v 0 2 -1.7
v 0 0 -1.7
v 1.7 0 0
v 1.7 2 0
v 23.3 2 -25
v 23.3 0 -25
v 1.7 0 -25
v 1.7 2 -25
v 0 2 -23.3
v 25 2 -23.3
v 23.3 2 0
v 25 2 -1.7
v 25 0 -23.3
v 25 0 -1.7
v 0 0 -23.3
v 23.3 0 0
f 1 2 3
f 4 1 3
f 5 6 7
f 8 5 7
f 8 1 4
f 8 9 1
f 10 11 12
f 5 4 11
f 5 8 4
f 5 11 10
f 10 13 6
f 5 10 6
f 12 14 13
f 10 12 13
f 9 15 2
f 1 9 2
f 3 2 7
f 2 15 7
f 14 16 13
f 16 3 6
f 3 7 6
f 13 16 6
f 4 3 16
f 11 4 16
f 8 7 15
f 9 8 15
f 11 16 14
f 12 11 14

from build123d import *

# Parameters (mm, degrees)
GPS_ANTENNA_DEPTH = 2


with BuildPart() as part:
    # Sketch1 → GPS Antenna (new body)
    with BuildSketch(Plane(origin=(0, 0, 0), x_dir=(1, 0, 0), z_dir=(0, 1, 0))):
        Polygon((0, 1.7), (1.7, 0), (23.3, 0), (25, 1.7), (25, 23.3), (23.3, 25), (1.7, 25), (0, 23.3), align=None)
    extrude(amount=GPS_ANTENNA_DEPTH)


solid = part.part
